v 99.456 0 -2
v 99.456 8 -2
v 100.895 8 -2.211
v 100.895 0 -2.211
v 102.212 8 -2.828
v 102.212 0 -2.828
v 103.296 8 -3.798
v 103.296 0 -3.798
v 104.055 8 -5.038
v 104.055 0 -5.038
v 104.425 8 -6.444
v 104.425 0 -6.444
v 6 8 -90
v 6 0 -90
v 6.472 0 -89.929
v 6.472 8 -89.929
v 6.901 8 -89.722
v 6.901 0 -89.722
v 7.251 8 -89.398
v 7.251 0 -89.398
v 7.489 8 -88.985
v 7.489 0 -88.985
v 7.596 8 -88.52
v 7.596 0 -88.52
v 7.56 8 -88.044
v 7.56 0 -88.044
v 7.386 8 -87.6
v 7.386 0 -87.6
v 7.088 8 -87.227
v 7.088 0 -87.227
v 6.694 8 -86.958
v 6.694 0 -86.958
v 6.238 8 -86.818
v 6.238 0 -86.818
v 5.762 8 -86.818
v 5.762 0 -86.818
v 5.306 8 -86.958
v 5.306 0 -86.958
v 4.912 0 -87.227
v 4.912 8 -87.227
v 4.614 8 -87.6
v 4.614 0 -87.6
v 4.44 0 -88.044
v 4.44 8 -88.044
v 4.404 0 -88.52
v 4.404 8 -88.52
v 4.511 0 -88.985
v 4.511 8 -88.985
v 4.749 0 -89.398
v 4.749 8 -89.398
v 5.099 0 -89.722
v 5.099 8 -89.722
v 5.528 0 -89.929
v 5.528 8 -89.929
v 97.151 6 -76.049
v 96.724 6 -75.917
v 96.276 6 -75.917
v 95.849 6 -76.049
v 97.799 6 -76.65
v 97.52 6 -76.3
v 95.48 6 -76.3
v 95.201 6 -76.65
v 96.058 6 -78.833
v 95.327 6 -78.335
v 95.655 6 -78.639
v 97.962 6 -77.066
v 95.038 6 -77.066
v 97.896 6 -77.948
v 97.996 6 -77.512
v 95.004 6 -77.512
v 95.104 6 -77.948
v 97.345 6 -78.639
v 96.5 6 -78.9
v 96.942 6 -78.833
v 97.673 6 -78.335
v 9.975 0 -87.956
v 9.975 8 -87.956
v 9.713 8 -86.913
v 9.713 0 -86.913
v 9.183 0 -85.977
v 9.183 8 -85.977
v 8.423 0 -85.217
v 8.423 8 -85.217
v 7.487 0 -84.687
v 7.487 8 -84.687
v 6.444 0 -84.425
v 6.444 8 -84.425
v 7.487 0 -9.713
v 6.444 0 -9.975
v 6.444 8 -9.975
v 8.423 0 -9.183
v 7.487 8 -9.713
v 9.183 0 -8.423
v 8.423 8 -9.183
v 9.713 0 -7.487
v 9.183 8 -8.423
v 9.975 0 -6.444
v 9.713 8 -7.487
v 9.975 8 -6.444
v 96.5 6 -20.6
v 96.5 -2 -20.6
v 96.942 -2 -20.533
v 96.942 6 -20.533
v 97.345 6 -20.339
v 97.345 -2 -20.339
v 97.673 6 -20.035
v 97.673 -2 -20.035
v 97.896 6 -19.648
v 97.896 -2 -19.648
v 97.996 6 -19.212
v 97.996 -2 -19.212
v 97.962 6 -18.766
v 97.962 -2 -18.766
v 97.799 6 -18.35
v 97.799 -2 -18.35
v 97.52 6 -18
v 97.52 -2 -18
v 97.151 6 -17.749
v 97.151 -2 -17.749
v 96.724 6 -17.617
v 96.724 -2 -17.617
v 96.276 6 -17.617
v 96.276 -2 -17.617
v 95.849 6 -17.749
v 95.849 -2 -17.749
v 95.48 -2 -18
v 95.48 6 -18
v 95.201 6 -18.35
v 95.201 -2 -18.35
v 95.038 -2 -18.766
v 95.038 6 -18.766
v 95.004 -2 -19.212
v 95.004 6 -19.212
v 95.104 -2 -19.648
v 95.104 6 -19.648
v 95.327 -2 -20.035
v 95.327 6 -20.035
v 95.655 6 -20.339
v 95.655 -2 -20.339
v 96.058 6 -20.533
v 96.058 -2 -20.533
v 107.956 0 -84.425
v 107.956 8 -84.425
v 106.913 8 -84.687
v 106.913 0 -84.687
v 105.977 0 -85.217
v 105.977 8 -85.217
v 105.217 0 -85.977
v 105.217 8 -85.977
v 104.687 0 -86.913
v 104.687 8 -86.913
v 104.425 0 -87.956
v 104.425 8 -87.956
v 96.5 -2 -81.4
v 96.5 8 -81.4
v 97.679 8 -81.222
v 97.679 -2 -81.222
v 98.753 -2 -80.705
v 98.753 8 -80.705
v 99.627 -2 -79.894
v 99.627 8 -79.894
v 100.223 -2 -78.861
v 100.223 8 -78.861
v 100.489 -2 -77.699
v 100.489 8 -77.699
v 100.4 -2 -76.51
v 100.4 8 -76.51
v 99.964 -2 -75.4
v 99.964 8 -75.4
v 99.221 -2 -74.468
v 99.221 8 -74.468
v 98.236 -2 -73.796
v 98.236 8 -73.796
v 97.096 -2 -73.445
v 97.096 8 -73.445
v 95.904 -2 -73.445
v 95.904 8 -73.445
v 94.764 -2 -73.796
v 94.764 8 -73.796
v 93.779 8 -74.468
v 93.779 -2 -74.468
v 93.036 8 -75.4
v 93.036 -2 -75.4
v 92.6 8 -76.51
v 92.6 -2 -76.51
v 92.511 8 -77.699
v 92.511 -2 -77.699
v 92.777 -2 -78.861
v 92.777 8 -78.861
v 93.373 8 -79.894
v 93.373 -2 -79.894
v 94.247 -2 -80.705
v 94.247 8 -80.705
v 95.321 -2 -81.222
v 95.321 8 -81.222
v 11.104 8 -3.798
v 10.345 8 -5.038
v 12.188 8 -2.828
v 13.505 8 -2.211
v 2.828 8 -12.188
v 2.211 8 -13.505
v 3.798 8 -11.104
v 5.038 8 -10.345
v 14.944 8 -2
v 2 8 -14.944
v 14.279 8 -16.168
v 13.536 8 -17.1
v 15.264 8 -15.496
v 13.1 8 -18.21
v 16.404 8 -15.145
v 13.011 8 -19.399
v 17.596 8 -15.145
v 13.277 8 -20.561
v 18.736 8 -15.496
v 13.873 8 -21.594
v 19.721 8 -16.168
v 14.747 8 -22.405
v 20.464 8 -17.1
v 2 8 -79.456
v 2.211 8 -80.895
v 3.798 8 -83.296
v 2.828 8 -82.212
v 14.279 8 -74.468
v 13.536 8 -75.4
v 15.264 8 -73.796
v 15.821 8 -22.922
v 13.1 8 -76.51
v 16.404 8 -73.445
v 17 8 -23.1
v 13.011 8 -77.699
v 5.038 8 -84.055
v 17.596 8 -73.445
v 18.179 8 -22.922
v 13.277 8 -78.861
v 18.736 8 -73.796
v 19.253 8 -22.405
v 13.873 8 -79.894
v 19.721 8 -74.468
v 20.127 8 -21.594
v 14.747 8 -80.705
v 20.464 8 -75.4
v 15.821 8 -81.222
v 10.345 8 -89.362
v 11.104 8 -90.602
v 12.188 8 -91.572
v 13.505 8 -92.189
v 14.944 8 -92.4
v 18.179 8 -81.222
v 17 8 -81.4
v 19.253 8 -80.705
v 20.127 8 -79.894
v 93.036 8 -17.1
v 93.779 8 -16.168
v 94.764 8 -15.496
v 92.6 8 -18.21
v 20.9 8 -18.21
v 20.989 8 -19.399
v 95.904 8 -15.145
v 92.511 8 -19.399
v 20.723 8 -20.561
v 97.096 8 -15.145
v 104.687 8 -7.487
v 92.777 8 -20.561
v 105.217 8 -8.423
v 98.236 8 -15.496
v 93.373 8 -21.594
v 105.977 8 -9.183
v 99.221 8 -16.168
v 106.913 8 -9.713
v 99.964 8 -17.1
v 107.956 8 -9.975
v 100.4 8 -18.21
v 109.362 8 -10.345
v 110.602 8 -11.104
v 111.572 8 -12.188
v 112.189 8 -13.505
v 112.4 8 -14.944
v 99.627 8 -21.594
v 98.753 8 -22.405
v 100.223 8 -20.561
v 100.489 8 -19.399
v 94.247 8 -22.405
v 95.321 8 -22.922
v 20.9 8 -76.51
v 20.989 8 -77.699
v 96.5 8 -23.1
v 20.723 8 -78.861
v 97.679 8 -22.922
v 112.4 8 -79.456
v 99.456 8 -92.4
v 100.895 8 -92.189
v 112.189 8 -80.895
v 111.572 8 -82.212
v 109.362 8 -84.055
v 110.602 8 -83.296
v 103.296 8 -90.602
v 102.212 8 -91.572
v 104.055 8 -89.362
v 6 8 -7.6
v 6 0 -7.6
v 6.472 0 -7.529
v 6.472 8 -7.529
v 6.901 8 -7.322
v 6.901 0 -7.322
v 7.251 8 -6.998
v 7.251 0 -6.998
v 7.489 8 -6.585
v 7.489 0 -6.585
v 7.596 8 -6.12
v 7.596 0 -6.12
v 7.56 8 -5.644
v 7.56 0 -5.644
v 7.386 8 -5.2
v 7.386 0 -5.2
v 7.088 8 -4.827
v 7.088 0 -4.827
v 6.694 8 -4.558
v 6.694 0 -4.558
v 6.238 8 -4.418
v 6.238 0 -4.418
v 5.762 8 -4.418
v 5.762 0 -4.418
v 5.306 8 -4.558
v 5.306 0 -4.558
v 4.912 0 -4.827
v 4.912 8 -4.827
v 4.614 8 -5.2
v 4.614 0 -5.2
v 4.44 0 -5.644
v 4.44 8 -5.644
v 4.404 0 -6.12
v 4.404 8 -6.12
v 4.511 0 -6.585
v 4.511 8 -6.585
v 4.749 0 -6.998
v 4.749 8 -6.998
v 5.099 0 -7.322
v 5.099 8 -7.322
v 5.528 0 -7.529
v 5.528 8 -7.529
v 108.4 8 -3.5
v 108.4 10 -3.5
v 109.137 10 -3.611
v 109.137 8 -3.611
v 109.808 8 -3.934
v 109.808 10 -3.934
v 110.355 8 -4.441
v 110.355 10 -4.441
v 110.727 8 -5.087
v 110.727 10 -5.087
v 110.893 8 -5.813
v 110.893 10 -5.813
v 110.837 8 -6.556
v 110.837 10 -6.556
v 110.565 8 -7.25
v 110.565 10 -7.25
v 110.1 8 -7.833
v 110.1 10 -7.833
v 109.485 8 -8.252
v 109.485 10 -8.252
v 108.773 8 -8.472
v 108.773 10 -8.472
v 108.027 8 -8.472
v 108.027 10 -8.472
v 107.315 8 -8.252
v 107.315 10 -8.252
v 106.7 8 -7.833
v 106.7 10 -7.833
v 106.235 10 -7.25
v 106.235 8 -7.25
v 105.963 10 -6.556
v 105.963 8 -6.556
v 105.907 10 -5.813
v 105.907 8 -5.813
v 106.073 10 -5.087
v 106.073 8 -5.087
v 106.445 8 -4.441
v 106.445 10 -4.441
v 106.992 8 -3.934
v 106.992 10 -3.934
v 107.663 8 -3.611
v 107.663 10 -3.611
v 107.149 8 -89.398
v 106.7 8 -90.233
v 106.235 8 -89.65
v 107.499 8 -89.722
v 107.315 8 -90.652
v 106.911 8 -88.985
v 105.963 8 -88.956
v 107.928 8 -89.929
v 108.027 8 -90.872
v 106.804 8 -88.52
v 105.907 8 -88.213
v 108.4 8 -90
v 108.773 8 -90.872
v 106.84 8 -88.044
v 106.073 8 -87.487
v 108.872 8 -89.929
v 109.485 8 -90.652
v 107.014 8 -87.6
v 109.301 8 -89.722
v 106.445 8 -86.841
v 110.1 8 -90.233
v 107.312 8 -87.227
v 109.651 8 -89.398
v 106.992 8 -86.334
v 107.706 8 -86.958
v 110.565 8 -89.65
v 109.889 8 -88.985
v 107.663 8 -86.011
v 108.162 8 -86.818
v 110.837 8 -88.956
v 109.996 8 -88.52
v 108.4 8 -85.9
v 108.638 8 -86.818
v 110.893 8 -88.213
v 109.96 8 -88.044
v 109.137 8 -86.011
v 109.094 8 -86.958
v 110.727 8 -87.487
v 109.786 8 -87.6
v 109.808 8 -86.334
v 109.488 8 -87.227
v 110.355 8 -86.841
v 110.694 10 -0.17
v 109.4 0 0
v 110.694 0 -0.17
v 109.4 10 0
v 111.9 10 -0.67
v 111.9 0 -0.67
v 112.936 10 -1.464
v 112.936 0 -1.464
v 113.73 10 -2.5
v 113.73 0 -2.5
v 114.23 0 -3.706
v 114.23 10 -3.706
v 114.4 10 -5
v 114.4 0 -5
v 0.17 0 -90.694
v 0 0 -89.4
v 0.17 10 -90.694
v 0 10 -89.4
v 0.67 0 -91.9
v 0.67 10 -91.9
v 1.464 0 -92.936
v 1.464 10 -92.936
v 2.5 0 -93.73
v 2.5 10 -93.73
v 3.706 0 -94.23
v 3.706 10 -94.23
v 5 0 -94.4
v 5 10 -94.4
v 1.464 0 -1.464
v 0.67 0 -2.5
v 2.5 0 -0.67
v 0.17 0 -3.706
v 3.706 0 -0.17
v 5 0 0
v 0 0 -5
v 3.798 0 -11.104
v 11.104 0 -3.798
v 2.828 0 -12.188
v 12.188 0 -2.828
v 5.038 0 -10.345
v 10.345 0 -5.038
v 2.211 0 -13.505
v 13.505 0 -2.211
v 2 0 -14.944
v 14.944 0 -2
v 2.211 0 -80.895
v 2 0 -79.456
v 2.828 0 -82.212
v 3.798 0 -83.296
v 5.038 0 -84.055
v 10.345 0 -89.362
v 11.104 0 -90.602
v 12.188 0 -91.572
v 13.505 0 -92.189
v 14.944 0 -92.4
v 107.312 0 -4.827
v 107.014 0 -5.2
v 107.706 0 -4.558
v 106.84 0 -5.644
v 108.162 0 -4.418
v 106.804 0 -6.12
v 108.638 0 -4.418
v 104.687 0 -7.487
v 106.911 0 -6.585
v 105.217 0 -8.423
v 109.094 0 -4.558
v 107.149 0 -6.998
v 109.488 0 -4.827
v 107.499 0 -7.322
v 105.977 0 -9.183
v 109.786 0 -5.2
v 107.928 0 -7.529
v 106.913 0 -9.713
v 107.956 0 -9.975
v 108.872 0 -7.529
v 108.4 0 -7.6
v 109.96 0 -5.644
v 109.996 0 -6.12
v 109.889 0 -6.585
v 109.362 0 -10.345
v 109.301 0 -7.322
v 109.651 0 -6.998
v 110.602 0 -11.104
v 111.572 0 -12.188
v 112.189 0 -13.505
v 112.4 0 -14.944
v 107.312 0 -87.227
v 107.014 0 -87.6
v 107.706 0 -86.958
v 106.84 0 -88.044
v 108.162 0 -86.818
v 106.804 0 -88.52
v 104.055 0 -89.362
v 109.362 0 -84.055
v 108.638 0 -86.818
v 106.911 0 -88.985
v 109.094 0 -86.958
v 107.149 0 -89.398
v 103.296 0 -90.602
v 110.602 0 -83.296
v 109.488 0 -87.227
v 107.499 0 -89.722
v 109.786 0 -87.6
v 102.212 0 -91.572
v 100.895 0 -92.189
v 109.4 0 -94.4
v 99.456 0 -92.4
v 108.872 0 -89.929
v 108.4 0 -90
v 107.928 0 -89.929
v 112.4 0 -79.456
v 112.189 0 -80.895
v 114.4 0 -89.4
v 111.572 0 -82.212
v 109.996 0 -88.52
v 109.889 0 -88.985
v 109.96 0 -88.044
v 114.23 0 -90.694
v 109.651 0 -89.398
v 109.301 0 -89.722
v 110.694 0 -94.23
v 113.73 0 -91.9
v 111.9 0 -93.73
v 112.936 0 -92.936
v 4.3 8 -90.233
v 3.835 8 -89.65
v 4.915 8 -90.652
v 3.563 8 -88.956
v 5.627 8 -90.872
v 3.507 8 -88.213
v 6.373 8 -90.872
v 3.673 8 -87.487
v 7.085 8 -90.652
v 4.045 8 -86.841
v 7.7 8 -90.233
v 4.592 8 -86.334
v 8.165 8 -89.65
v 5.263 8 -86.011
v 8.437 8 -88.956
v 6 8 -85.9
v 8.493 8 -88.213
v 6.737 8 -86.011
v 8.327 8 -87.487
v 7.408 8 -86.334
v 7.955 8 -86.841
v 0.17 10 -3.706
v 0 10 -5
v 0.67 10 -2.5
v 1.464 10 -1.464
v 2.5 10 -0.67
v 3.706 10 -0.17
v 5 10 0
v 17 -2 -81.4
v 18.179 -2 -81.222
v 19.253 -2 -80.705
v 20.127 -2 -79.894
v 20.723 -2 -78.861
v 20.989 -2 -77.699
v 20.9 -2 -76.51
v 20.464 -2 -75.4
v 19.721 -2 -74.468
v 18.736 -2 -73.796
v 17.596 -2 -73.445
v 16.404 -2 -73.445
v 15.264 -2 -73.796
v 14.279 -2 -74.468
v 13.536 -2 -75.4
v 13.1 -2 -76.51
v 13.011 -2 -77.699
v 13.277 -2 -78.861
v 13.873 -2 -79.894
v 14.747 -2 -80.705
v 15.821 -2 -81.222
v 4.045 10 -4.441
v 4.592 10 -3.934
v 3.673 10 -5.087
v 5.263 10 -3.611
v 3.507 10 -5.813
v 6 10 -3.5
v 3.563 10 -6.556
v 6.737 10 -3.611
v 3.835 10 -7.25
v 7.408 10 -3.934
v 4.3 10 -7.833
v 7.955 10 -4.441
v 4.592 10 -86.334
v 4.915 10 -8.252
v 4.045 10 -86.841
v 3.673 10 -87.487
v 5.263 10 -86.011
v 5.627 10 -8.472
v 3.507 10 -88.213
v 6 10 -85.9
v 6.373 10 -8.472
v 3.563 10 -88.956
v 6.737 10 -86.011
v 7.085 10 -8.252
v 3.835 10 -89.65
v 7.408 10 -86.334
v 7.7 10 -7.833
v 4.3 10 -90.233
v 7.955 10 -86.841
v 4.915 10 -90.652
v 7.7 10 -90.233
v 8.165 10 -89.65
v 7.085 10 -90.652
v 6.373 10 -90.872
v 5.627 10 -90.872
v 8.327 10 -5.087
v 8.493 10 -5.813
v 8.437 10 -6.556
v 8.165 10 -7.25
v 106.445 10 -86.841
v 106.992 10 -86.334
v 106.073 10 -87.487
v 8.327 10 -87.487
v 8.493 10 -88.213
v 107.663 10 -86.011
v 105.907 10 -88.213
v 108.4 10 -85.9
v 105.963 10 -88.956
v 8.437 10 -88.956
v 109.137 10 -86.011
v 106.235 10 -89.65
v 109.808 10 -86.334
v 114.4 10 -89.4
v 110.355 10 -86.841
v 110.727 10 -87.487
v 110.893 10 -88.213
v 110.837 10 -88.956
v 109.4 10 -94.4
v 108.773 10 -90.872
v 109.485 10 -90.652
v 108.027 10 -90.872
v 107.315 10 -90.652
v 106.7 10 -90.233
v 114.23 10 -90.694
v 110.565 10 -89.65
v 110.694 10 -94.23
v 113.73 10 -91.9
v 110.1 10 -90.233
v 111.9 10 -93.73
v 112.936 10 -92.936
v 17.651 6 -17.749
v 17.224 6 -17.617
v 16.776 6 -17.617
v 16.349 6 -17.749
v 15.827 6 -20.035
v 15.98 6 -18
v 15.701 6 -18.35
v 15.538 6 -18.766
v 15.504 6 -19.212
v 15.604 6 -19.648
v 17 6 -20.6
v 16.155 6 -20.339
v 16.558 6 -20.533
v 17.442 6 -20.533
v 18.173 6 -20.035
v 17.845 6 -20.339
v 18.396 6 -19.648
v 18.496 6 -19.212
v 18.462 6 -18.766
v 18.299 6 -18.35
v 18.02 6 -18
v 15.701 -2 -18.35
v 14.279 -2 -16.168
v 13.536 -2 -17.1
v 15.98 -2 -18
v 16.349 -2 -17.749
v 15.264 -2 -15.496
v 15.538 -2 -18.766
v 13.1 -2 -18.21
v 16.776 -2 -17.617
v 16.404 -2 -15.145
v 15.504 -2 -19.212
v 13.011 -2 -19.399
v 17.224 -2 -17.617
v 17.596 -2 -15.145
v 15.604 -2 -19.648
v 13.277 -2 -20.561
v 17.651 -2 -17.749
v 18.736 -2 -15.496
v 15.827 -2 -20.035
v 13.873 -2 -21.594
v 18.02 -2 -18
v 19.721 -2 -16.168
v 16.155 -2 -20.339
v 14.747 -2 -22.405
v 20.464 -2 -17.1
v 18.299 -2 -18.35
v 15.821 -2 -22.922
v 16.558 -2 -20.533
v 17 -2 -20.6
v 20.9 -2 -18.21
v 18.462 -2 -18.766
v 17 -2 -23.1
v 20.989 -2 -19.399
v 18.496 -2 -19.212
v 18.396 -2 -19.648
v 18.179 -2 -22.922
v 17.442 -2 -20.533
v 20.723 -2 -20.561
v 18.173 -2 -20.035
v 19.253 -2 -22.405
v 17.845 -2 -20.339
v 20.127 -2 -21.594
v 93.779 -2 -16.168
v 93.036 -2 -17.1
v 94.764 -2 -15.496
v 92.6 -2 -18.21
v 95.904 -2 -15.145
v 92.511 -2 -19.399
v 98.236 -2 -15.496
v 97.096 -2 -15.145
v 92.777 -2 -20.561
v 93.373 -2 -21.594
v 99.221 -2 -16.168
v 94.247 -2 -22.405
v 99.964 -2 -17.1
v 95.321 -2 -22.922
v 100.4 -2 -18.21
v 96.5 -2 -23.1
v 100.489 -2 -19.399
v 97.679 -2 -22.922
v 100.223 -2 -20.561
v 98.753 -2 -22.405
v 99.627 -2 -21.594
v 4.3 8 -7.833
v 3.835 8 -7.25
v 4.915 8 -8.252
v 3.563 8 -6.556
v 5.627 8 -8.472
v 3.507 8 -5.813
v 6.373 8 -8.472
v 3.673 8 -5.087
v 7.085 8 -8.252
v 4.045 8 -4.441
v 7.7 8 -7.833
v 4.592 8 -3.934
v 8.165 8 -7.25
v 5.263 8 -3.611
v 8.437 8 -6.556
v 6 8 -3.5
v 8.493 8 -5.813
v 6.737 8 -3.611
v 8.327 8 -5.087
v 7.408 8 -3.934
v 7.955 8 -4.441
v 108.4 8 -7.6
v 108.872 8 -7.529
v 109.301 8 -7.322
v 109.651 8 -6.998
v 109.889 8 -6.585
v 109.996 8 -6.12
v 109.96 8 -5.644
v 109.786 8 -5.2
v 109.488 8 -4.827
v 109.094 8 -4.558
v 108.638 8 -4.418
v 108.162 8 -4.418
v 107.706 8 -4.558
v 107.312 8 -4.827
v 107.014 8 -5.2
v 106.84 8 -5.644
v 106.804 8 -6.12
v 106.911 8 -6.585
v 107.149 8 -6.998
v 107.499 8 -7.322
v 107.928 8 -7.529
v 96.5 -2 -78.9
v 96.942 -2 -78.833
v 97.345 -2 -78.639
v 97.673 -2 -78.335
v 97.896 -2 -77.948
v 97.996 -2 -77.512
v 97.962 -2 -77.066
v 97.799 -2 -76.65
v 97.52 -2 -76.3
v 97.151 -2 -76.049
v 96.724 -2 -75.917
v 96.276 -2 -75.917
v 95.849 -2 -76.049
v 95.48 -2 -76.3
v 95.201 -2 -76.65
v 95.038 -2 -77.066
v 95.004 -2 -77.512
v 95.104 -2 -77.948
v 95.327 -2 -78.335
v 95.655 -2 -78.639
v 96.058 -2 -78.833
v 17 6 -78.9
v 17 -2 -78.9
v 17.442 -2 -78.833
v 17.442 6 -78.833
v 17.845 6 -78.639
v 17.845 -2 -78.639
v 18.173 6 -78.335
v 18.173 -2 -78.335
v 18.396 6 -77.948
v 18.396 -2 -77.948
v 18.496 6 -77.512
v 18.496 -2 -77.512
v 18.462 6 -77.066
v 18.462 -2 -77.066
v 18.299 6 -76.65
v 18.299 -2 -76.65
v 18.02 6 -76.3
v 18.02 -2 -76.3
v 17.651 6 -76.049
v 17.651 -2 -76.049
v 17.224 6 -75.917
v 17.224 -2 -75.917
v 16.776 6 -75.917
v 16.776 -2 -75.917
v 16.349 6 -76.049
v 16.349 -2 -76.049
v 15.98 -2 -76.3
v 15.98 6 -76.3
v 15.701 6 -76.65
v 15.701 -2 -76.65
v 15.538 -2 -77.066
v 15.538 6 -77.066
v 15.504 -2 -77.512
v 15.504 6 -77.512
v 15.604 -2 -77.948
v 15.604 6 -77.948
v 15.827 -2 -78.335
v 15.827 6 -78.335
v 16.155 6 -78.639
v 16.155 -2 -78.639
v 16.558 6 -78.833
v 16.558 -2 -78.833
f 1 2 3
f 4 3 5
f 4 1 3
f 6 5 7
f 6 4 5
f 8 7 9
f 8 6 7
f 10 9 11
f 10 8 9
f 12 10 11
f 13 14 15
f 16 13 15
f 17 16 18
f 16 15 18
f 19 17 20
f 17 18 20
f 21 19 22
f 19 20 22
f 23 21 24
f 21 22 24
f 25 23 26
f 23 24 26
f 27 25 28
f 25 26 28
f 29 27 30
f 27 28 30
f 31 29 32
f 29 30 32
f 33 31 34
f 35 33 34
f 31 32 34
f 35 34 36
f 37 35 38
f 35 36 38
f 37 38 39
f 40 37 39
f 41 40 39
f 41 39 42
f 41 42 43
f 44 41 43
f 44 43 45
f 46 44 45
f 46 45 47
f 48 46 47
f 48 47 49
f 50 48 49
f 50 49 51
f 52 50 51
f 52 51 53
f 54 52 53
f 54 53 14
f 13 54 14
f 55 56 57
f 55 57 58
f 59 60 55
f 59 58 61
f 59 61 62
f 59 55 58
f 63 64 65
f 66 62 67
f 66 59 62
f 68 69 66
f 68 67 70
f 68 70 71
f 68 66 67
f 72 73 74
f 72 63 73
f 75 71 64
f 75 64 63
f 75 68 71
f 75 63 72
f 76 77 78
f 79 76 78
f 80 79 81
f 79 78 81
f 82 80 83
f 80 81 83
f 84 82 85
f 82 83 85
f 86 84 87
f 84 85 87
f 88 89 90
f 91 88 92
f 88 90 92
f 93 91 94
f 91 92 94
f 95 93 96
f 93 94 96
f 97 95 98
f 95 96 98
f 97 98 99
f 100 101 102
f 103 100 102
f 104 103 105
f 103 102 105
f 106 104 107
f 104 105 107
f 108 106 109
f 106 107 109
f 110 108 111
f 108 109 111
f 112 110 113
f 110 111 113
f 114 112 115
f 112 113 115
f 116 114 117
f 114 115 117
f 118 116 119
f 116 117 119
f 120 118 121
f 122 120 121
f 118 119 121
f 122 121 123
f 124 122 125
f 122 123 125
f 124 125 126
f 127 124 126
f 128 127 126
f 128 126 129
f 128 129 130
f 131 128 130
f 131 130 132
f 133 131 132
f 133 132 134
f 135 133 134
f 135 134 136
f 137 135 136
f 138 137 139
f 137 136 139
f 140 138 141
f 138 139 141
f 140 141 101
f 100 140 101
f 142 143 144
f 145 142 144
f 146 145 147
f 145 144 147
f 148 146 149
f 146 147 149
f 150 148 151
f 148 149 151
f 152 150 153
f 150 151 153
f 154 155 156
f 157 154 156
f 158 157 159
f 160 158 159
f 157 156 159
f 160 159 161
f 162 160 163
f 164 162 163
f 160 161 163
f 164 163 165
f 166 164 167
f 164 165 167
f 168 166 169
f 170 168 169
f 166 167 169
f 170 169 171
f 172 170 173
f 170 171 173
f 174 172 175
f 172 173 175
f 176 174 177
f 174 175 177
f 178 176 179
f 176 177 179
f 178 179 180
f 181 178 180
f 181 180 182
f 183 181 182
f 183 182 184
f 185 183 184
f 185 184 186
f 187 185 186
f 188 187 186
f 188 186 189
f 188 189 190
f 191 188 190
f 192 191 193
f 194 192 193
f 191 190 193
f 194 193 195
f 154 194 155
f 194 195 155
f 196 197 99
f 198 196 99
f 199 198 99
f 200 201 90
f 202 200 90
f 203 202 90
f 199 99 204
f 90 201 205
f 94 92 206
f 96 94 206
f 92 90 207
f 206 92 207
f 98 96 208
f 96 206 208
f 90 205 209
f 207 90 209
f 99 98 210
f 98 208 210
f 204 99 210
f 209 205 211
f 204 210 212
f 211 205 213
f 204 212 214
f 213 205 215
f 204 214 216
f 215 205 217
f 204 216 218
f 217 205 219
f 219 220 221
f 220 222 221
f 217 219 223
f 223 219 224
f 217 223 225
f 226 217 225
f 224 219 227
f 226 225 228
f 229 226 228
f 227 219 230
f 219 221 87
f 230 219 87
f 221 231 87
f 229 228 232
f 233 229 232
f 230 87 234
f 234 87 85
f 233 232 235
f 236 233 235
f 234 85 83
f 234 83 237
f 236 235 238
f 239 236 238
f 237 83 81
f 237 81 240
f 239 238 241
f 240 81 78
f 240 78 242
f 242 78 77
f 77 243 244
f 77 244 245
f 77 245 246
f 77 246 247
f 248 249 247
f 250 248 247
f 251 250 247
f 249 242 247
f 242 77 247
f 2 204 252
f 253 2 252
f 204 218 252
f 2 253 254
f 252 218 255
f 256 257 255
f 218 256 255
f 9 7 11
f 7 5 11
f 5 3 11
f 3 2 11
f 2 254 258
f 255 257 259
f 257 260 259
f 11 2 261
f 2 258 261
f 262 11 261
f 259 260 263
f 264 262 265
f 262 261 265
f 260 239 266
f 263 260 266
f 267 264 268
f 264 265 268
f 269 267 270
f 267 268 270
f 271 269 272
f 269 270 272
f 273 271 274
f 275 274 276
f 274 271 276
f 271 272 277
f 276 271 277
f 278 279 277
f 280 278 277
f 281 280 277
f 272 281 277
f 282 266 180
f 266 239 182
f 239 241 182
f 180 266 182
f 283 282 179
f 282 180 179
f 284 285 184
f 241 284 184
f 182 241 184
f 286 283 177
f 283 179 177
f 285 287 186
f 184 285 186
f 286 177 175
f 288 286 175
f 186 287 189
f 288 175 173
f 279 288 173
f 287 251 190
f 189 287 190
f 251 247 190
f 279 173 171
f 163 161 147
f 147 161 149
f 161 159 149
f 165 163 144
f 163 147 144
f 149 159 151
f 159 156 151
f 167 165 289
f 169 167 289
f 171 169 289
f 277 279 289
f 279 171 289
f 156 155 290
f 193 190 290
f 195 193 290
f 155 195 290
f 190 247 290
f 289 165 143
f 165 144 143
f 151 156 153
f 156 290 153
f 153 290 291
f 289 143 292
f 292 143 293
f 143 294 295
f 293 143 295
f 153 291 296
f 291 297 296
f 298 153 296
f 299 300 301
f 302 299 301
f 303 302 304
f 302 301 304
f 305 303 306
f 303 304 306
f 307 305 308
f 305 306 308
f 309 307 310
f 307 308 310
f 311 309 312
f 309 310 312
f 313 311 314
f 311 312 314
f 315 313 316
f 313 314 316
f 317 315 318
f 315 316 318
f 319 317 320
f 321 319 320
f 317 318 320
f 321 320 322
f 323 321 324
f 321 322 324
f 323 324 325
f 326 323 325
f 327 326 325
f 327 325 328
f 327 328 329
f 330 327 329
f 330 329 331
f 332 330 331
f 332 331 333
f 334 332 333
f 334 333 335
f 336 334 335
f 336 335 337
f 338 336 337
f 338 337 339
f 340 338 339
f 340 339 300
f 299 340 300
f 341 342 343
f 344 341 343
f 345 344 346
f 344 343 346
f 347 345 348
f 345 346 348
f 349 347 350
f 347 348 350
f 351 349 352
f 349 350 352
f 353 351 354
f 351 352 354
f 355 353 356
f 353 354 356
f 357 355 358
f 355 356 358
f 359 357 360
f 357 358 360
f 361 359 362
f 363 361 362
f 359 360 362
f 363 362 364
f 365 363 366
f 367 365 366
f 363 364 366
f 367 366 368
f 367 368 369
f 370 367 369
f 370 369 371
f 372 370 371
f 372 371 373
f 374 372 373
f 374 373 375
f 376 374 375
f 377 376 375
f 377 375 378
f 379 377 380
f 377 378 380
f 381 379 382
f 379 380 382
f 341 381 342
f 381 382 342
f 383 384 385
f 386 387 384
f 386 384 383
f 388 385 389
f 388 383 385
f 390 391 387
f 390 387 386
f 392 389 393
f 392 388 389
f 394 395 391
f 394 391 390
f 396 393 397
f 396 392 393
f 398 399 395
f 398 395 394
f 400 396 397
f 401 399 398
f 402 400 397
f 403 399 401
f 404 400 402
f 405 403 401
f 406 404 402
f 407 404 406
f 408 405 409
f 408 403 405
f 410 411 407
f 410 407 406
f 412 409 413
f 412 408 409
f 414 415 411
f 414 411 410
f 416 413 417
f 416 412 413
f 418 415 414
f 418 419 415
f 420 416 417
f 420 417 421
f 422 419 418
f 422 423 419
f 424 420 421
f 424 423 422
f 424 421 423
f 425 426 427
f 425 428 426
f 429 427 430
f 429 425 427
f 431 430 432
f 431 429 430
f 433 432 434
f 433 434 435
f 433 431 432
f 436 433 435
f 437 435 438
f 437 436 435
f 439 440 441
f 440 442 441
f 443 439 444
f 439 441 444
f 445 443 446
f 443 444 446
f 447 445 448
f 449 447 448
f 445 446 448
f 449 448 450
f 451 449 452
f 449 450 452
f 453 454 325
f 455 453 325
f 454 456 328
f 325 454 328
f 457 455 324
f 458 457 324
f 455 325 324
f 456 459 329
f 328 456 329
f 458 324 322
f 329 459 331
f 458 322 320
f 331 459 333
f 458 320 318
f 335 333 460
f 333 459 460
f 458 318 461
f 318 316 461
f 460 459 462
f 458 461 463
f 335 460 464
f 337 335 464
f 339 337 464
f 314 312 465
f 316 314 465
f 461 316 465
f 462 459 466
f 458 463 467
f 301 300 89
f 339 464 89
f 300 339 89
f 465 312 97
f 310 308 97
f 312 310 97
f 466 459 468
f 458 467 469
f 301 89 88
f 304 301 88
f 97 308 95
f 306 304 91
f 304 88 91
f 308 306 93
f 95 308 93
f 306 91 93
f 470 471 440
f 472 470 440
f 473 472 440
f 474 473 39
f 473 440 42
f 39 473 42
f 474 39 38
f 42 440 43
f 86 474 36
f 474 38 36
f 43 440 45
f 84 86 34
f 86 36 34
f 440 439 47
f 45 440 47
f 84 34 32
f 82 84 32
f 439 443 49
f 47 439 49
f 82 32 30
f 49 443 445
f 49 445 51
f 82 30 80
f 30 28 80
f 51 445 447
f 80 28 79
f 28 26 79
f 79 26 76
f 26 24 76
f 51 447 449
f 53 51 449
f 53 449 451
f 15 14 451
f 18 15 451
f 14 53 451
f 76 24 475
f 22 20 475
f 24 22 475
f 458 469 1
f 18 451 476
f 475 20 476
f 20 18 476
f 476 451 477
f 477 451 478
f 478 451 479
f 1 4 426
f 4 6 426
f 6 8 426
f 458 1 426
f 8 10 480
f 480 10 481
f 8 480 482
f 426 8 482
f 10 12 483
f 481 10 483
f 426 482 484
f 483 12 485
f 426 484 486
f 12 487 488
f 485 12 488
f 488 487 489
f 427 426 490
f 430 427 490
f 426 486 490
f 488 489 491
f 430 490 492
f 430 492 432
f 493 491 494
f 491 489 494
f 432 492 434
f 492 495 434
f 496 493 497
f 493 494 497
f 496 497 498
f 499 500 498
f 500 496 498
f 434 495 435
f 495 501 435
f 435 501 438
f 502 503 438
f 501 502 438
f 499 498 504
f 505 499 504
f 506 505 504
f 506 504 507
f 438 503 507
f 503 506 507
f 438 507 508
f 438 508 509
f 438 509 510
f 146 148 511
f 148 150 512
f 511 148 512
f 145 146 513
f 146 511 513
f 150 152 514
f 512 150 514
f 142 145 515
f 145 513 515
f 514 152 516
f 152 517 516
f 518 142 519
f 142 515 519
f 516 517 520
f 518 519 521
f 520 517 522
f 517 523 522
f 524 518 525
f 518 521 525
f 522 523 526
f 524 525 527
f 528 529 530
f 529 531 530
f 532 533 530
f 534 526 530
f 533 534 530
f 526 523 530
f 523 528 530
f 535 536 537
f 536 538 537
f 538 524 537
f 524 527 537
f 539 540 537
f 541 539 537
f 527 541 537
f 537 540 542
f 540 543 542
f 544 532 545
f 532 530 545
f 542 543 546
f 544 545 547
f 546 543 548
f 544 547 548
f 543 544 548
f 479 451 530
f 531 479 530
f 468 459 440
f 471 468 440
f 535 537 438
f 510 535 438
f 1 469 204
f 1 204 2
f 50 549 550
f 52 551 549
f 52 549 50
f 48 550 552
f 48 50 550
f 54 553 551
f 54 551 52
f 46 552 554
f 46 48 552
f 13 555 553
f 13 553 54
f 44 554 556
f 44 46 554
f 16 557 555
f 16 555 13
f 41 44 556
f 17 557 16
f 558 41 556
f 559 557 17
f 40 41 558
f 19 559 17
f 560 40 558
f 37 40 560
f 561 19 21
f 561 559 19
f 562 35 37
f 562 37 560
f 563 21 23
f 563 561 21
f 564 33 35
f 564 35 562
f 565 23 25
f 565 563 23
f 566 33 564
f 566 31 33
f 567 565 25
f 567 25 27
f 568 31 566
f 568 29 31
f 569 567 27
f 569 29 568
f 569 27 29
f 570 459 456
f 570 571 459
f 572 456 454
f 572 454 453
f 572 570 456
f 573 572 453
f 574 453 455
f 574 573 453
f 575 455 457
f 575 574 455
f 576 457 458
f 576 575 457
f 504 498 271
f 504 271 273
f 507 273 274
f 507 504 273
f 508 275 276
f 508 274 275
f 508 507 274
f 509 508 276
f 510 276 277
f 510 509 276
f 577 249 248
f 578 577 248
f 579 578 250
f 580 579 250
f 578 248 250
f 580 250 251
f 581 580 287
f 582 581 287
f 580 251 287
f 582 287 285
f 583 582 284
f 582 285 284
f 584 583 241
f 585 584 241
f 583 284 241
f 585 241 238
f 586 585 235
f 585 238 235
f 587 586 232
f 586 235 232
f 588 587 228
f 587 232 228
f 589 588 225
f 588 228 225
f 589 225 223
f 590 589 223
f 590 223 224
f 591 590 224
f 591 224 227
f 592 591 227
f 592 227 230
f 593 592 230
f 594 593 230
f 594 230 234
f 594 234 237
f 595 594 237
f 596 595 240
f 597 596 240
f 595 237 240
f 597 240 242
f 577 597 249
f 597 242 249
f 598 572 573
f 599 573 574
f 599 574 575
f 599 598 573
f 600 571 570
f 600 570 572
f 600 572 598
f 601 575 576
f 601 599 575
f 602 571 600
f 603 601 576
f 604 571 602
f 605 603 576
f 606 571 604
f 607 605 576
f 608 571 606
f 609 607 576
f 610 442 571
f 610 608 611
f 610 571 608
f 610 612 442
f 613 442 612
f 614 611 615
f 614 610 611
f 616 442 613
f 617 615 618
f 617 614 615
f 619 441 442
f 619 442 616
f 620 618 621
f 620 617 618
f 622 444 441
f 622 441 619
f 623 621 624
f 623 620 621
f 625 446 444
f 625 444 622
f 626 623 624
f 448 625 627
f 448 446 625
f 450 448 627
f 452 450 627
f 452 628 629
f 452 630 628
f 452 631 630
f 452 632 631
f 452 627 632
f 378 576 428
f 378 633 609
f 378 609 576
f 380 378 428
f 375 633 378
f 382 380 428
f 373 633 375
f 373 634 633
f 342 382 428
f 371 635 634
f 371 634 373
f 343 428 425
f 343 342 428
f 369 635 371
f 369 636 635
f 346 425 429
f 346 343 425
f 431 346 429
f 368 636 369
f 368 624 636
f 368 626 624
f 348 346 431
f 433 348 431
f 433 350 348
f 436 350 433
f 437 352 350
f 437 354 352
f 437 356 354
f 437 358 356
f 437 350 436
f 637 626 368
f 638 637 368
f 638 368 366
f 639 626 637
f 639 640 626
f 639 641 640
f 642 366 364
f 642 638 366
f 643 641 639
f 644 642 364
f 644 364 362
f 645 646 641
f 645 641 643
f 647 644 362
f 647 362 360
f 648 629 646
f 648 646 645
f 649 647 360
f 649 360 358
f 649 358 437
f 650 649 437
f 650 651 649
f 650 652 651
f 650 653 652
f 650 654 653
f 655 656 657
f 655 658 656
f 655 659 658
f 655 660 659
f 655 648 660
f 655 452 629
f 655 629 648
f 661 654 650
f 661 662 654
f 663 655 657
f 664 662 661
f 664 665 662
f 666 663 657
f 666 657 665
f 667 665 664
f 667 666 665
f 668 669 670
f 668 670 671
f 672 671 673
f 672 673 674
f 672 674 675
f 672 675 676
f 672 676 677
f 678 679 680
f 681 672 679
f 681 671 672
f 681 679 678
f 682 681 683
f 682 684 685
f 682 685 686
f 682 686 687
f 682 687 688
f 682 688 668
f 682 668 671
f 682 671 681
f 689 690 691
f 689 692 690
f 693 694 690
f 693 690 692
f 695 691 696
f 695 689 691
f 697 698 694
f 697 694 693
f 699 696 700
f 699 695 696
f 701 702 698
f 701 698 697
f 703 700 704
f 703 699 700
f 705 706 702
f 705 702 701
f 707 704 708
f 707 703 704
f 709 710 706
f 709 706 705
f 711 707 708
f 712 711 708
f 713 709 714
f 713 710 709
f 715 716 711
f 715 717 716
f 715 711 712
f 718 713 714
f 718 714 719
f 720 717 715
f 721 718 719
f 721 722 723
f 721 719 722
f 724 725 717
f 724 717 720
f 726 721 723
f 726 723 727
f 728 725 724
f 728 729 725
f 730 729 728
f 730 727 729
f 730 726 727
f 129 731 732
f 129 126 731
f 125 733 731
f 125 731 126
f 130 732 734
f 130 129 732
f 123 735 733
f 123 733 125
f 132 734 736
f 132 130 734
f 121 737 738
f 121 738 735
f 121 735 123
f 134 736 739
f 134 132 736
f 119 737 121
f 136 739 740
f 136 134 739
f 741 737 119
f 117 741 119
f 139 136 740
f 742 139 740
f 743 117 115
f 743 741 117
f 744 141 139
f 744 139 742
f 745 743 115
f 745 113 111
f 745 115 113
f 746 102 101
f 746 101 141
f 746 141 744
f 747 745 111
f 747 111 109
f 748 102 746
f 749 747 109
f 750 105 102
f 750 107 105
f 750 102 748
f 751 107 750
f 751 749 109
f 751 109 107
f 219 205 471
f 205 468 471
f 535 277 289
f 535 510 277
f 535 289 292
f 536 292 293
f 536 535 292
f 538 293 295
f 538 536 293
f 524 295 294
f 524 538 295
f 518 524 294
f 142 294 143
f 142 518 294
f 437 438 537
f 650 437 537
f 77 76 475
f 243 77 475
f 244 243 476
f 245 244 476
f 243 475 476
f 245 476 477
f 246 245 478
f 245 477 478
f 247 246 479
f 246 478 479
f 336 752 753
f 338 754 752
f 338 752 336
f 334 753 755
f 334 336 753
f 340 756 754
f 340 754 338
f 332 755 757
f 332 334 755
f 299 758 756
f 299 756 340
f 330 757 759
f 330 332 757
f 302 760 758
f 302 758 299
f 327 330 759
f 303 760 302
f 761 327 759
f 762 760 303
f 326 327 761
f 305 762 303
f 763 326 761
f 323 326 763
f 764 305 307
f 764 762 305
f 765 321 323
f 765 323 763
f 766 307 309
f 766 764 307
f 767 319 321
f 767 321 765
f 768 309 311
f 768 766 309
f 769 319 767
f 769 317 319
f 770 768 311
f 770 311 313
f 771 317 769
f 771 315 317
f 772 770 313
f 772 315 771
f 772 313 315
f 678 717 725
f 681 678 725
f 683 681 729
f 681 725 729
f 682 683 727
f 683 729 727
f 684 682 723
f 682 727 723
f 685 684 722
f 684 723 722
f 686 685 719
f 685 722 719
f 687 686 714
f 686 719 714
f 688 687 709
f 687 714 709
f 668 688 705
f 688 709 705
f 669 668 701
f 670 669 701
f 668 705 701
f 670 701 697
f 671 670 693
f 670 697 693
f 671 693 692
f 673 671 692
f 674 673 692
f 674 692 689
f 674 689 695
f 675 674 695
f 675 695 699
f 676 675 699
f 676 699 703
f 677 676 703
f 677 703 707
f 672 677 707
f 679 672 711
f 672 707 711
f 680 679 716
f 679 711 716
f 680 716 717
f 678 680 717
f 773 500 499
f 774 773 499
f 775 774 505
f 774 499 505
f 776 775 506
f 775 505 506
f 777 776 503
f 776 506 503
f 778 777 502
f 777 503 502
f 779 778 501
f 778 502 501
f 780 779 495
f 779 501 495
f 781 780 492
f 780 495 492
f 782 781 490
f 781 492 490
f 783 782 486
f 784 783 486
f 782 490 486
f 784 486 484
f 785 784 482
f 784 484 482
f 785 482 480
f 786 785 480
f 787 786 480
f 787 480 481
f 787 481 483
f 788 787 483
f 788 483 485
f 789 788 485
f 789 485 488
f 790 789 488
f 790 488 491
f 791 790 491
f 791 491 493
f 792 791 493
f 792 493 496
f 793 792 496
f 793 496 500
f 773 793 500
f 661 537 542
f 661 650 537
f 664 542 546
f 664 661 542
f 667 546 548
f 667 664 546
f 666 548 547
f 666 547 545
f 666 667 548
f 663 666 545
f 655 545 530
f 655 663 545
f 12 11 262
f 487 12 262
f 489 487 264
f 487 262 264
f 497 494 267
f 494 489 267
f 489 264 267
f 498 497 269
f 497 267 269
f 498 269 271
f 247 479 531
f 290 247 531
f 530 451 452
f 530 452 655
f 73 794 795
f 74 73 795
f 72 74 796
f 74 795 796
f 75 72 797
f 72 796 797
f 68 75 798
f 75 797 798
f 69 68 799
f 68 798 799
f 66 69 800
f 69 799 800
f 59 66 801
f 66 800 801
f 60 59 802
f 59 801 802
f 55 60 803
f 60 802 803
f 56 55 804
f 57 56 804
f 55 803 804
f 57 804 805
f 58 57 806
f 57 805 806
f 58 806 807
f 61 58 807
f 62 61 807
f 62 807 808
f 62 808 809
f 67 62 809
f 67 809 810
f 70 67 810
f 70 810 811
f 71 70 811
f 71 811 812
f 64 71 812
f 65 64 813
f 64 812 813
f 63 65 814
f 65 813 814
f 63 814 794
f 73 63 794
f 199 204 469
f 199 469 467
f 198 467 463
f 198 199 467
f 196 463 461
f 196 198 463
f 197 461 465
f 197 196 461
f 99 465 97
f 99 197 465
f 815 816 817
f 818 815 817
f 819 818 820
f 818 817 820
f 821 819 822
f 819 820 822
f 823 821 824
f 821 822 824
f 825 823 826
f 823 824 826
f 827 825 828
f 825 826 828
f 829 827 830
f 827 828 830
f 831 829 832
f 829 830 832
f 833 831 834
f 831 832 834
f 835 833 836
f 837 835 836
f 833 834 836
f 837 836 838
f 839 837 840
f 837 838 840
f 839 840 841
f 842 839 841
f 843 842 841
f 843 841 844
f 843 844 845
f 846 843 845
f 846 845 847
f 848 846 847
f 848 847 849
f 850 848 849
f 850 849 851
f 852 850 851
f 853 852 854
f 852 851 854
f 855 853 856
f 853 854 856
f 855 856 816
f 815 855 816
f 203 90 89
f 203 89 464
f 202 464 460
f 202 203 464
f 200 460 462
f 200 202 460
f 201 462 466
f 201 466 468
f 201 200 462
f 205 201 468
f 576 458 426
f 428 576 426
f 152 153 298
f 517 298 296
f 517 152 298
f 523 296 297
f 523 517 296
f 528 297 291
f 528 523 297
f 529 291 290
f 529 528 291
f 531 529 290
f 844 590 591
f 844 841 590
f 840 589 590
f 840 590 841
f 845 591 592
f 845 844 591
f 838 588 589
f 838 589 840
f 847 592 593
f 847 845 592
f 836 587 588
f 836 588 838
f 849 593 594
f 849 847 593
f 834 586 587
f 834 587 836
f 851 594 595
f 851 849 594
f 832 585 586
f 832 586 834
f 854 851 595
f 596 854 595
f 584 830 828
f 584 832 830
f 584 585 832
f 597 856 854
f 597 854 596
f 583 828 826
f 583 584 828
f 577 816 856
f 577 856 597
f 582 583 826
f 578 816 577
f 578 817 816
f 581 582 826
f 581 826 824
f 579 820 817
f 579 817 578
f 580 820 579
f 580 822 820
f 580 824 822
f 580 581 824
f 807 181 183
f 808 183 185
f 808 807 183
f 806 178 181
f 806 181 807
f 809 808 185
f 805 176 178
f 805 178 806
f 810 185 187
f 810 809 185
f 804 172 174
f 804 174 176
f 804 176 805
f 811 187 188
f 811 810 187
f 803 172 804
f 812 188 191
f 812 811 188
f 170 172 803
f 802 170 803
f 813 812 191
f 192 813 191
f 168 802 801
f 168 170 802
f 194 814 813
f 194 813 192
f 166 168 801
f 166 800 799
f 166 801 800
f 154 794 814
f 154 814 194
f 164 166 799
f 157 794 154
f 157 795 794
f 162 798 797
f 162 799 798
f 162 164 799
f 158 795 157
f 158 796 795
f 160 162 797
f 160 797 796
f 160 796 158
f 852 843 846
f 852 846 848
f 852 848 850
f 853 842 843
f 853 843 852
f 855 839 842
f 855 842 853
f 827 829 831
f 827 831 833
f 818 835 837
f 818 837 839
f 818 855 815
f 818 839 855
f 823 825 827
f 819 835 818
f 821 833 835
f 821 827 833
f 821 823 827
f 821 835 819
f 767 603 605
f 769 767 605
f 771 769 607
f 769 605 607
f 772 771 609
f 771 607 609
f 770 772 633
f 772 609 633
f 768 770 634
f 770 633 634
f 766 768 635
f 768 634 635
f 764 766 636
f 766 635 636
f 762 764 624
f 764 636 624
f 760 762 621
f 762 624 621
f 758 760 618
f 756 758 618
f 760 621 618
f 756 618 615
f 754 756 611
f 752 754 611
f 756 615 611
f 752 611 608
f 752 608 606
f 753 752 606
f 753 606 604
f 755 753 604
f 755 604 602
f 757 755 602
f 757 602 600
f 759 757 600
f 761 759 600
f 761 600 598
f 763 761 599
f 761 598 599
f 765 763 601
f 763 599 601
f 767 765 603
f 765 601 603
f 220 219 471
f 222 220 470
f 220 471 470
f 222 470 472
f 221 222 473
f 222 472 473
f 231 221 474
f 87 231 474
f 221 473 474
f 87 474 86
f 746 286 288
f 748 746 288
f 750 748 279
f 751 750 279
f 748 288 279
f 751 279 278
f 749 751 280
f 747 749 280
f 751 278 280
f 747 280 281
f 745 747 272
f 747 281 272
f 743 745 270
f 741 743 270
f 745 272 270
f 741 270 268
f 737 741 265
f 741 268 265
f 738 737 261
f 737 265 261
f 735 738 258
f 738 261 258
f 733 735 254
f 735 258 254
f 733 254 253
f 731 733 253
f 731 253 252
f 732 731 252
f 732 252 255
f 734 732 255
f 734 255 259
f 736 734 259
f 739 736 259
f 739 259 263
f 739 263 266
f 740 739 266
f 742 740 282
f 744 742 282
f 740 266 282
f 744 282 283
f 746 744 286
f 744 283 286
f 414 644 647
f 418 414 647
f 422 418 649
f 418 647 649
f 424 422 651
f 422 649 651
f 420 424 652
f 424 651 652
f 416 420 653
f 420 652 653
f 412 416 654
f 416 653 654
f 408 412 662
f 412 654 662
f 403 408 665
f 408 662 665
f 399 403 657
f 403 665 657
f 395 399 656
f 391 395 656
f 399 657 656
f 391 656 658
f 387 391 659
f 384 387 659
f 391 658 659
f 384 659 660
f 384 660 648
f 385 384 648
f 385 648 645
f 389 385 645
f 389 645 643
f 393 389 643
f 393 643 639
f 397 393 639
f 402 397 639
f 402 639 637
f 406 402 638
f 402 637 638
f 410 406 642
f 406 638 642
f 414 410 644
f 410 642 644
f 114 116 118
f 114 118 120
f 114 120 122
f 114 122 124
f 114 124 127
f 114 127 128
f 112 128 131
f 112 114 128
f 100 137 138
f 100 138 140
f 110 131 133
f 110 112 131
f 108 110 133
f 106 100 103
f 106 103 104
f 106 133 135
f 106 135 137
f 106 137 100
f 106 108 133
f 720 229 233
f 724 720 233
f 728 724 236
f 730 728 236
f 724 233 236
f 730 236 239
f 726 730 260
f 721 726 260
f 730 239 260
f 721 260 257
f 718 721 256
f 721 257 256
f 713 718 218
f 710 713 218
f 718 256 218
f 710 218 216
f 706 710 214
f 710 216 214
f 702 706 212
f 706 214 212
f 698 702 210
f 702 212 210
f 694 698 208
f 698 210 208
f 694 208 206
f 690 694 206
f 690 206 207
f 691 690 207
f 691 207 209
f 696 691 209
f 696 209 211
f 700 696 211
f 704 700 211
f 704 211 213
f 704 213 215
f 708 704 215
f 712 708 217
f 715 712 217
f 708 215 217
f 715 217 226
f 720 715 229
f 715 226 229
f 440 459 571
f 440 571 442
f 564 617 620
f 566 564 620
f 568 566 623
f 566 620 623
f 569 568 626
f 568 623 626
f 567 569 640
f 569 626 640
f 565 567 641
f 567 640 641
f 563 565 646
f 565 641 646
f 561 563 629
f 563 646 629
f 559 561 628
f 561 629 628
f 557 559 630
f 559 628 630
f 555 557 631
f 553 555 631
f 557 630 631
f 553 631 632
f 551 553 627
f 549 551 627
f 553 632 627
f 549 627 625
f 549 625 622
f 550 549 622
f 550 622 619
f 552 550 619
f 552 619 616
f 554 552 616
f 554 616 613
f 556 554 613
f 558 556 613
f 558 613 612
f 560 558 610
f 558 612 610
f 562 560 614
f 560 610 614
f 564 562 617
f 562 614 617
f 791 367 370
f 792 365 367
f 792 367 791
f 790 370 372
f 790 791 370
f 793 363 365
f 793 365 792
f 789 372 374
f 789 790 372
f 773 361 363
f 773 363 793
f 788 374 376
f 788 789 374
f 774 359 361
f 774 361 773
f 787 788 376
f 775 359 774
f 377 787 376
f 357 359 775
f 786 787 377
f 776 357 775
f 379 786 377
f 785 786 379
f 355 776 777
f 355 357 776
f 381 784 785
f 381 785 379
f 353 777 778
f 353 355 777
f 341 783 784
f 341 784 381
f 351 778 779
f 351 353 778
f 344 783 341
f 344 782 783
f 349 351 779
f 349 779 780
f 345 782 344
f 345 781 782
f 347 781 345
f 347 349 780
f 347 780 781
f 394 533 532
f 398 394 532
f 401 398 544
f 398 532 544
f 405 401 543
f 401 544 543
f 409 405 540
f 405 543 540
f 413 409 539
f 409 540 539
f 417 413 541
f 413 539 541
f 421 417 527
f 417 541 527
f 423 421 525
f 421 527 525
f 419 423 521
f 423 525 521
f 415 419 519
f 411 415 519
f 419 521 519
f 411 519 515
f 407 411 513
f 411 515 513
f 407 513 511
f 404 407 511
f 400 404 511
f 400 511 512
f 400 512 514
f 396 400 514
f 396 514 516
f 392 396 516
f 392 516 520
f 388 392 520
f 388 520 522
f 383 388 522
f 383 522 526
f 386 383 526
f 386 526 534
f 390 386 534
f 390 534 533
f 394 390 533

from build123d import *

# Parameters (mm, degrees)
SKETCH1_W            = 114.4
SKETCH1_H            = 94.4
BOSS_EXTRUDE1_DEPTH  = 10
SHELL2_T             = -2
FILLET3_R            = 5
FILLET4_R            = 5
SKETCH5_R            = 4
BOSS_EXTRUDE12_DEPTH = 8
FILLET5_R            = 5
FILLET6_R            = 5
FILLET7_R            = 5
FILLET8_R            = 5
FILLET9_R            = 5
FILLET10_R           = 5
FILLET11_DEPTH       = 9
FILLET12_DEPTH       = 9
SKETCH6_R            = 1.6
CUT_EXTRUDE1_DEPTH   = 10
SKETCH7_R            = 4
BOSS_EXTRUDE13_DEPTH = 10
SKETCH8_R            = 1.5
CUT_EXTRUDE2_DEPTH   = 8
SKETCH9_R            = 2.5
CUT_EXTRUDE3_DEPTH   = 2


with BuildPart() as part:
    # Sketch1 → Boss-Extrude1 (new body)
    with BuildSketch(Plane(origin=(0, 0, 0), x_dir=(1, 0, 0), z_dir=(0, 1, 0))):
        with Locations((57.2, 47.2)):
            Rectangle(SKETCH1_W, SKETCH1_H)
    extrude(amount=BOSS_EXTRUDE1_DEPTH)

    # Shell2
    shell2_openings = [part.faces().sort_by_distance(p)[0] for p in [
        (57.2, 0, -47.2),
    ]]
    offset(amount=SHELL2_T, openings=shell2_openings, kind=Kind.INTERSECTION)

    # Fillet3
    fillet3_edges = [part.edges().sort_by_distance(p)[0] for p in [
        (0, 5, -94.4),
        (114.4, 5, -94.4),
        (114.4, 5, 0),
        (0, 5, 0),
    ]]
    fillet(fillet3_edges, radius=FILLET3_R)

    # Fillet4
    fillet4_edges = [part.edges().sort_by_distance(p)[0] for p in [
        (2, 4, -92.4),
        (2, 4, -2),
        (112.4, 4, -2),
        (112.4, 4, -92.4),
    ]]
    fillet(fillet4_edges, radius=FILLET4_R)

    # Sketch5 → Boss-Extrude12 (add)
    with BuildSketch(Plane(origin=(0, 8, 0), x_dir=(-1, 0, 0), z_dir=(0, -1, 0))):
        with Locations((-108.4, 6)):
            Circle(SKETCH5_R)
        with Locations((-108.4, 88.4)):
            Circle(SKETCH5_R)
        with Locations((-6, 88.4)):
            Circle(SKETCH5_R)
        with Locations((-6, 6)):
            Circle(SKETCH5_R)
    extrude(amount=BOSS_EXTRUDE12_DEPTH)

    # Fillet5
    # the kernel refuses this fillet: 5 mm, written as the material it adds along each edge
    with BuildSketch(Plane(origin=(112.372048604, 0, -6.472048604), x_dir=(-0.783459029597643, 0, -0.6214434398574978), z_dir=(0, 1, 0))) as fillet5_piece_1_section:
        with BuildLine():
            CenterArc((9.160403969, -3.547792862), FILLET5_R, 134.800989095, 83.620629792)
            Line((5.243108821, -6.655010061), (4.851379306, -6.965731781))
            ThreePointArc((4.851379306, -6.965731781), (-0.085536357, -0.74172022), (-0.422348831, -0.26762187))
            Line((-0.422348831, -0.26762187), (0.35232323, 0.354779286))
            ThreePointArc((0.35232323, 0.354779286), (2.818585837, -0.661765711), (5.284848444, 0.354779286))
            Line((5.284848444, 0.354779286), (5.637171673, 0))
        make_face()
    fillet5_piece_1 = extrude(amount=29.180673535, mode=Mode.PRIVATE)
    fillet5_piece_1 = split(fillet5_piece_1, bisect_by=Plane(origin=(112.372048604, 10, -6.472048604), z_dir=(0, -1, 0)), keep=Keep.TOP, mode=Mode.PRIVATE)
    add(fillet5_piece_1)

    # Fillet6
    # the kernel refuses this fillet: 5 mm, written as the material it adds along each edge
    with BuildSketch(Plane(origin=(107.927951396, 0, -2.027951396), x_dir=(-0.6214434398574917, 0, -0.7834590295976479), z_dir=(0, 1, 0))) as fillet6_piece_1_section:
        with BuildLine():
            CenterArc((9.160403969, 3.547792862), FILLET6_R, 141.578381114, 83.620629792)
            Line((5.243108821, 6.655010061), (4.851379306, 6.965731781))
            ThreePointArc((4.851379306, 6.965731781), (-0.085536357, 0.74172022), (-0.422348831, 0.26762187))
            Line((-0.422348831, 0.26762187), (0.35232323, -0.354779286))
            ThreePointArc((0.35232323, -0.354779286), (2.818585837, 0.661765711), (5.284848444, -0.354779286))
            Line((5.284848444, -0.354779286), (5.637171673, 0))
        make_face()
    fillet6_piece_1 = extrude(amount=29.180673535, mode=Mode.PRIVATE)
    fillet6_piece_1 = split(fillet6_piece_1, bisect_by=Plane(origin=(107.927951396, 10, -2.027951396), z_dir=(0, -1, 0)), keep=Keep.TOP, mode=Mode.PRIVATE)
    add(fillet6_piece_1)

    # Fillet7
    # the kernel refuses this fillet: 5 mm, written as the material it adds along each edge
    with BuildSketch(Plane(origin=(112.372048604, 0, -87.927951396), x_dir=(-0.783459029597643, 0, 0.6214434398574978), z_dir=(0, 1, 0))) as fillet7_piece_1_section:
        with BuildLine():
            CenterArc((9.160403969, 3.547792862), FILLET7_R, 141.578381114, 83.620629792)
            Line((5.243108821, 6.655010061), (4.851379306, 6.965731781))
            ThreePointArc((4.851379306, 6.965731781), (-0.085536357, 0.74172022), (-0.422348831, 0.26762187))
            Line((-0.422348831, 0.26762187), (0.35232323, -0.354779286))
            ThreePointArc((0.35232323, -0.354779286), (2.818585837, 0.661765711), (5.284848444, -0.354779286))
            Line((5.284848444, -0.354779286), (5.637171673, 0))
        make_face()
    fillet7_piece_1 = extrude(amount=29.180673535, mode=Mode.PRIVATE)
    fillet7_piece_1 = split(fillet7_piece_1, bisect_by=Plane(origin=(112.372048604, 10, -87.927951396), z_dir=(0, -1, 0)), keep=Keep.TOP, mode=Mode.PRIVATE)
    add(fillet7_piece_1)

    # Fillet8
    # the kernel refuses this fillet: 5 mm, written as the material it adds along each edge
    with BuildSketch(Plane(origin=(107.927951396, 0, -92.372048604), x_dir=(-0.6214434398574917, 0, 0.7834590295976479), z_dir=(0, 1, 0))) as fillet8_piece_1_section:
        with BuildLine():
            CenterArc((9.160403969, -3.547792862), FILLET8_R, 134.800989095, 83.620629792)
            Line((5.243108821, -6.655010061), (4.851379306, -6.965731781))
            ThreePointArc((4.851379306, -6.965731781), (-0.085536357, -0.74172022), (-0.422348831, -0.26762187))
            Line((-0.422348831, -0.26762187), (0.35232323, 0.354779286))
            ThreePointArc((0.35232323, 0.354779286), (2.818585837, -0.661765711), (5.284848444, 0.354779286))
            Line((5.284848444, 0.354779286), (5.637171673, 0))
        make_face()
    fillet8_piece_1 = extrude(amount=29.180673535, mode=Mode.PRIVATE)
    fillet8_piece_1 = split(fillet8_piece_1, bisect_by=Plane(origin=(107.927951396, 10, -92.372048604), z_dir=(0, -1, 0)), keep=Keep.TOP, mode=Mode.PRIVATE)
    add(fillet8_piece_1)

    # Fillet9
    # the kernel refuses this fillet: 5 mm, written as the material it adds along each edge
    with BuildSketch(Plane(origin=(6.472048604, 29.180673535, -2.027951396), x_dir=(0.9999945577477605, 0, 0.003299162751511756), z_dir=(0, -1, 0))) as fillet9_piece_1_section:
        with BuildLine():
            CenterArc((8.4557736, -4.999972789), FILLET9_R, 89.810971555, 83.620629792)
            Line((3.488593561, -4.428026585), (2.991875557, -4.370831965))
            ThreePointArc((2.991875557, -4.370831965), (2.264117061, -1.804476076), (-0.060643809, -0.496308703))
            Line((-0.060643809, -0.496308703), (-0.051154492, 0.497376334))
            ThreePointArc((-0.051154492, 0.497376334), (0.52969032, 0.526206725), (8.473918995, 0.499997279))
            Line((8.473918995, 0.499997279), (8.472269414, 0))
        make_face()
    fillet9_piece_1 = extrude(amount=29.180673535, mode=Mode.PRIVATE)
    fillet9_piece_1 = split(fillet9_piece_1, bisect_by=Plane(origin=(6.472048604, 10, -2.027951396), z_dir=(0, -1, 0)), keep=Keep.TOP, mode=Mode.PRIVATE)
    add(fillet9_piece_1)

    # Fillet10
    # the kernel refuses this fillet: 5 mm, written as the material it adds along each edge
    with BuildSketch(Plane(origin=(2.027951396, 29.180673535, -6.472048604), x_dir=(0.783459029597646, 0, -0.6214434398574942), z_dir=(0, -1, 0))) as fillet10_piece_1_section:
        with BuildLine():
            CenterArc((9.160403969, -3.547792862), FILLET10_R, 134.800989095, 83.620629792)
            Line((5.243108821, -6.655010061), (4.851379306, -6.965731781))
            ThreePointArc((4.851379306, -6.965731781), (-0.085536357, -0.74172022), (-0.422348831, -0.26762187))
            Line((-0.422348831, -0.26762187), (0.35232323, 0.354779286))
            ThreePointArc((0.35232323, 0.354779286), (2.818585837, -0.661765711), (5.284848444, 0.354779286))
            Line((5.284848444, 0.354779286), (5.637171673, 0))
        make_face()
    fillet10_piece_1 = extrude(amount=29.180673535, mode=Mode.PRIVATE)
    fillet10_piece_1 = split(fillet10_piece_1, bisect_by=Plane(origin=(2.027951396, 10, -6.472048604), z_dir=(0, -1, 0)), keep=Keep.TOP, mode=Mode.PRIVATE)
    add(fillet10_piece_1)

    # Fillet11: read off the stored shape, not the designer's step
    # Fillet11 outline → Fillet11 (add)
    with BuildSketch(Plane(origin=(0, 0, 0), x_dir=(1, 0, 0), z_dir=(0, 1, 0))):
        with BuildLine():
            ThreePointArc((2, 79.45572809), (3.273220038, 82.789061423), (6.444444444, 84.42476804))
            ThreePointArc((6.444444444, 84.42476804), (3.51422624, 85.266163882), (2.027951396, 87.927951396))
            ThreePointArc((2.027951396, 87.927951396), (2.006992739, 87.664345398), (2, 87.4))
            Line((2, 87.4), (2, 79.45572809))
        make_face()
    extrude(amount=FILLET11_DEPTH)

    # Fillet12: read off the stored shape, not the designer's step
    # Fillet12 outline → Fillet12 (add)
    with BuildSketch(Plane(origin=(0, 0, 0), x_dir=(1, 0, 0), z_dir=(0, 1, 0))):
        with BuildLine():
            ThreePointArc((9.97523196, 87.955555556), (11.610938577, 91.126779962), (14.94427191, 92.4))
            Line((14.94427191, 92.4), (7, 92.4))
            ThreePointArc((7, 92.4), (6.735654602, 92.393007261), (6.472048604, 92.372048604))
            ThreePointArc((6.472048604, 92.372048604), (9.133836118, 90.88577376), (9.97523196, 87.955555556))
        make_face()
    extrude(amount=FILLET12_DEPTH)

    # Sketch6 → Cut-Extrude1 (cut)
    with BuildSketch(Plane(origin=(0, 0, 0), x_dir=(-1, 0, 0), z_dir=(0, -1, 0))):
        with Locations(Location((-6, 6, 0), (0, 0, 90))):
            Circle(SKETCH6_R)
        with Locations(Location((-108.4, 88.4, 0), (0, 0, 90))):
            Circle(SKETCH6_R)
        with Locations(Location((-108.4, 6, 0), (0, 0, 90))):
            Circle(SKETCH6_R)
        with Locations(Location((-6, 88.4, 0), (0, 0, 90))):
            Circle(SKETCH6_R)
    extrude(amount=-CUT_EXTRUDE1_DEPTH, mode=Mode.SUBTRACT)

    # Sketch7 → Boss-Extrude13 (add)
    with BuildSketch(Plane(origin=(0, 8, 0), x_dir=(-1, 0, 0), z_dir=(0, -1, 0))):
        with Locations(Location((-96.5, 19.1, 0), (0, 0, 90))):
            Circle(SKETCH7_R)
        with Locations(Location((-17, 19.1, 0), (0, 0, 90))):
            Circle(SKETCH7_R)
        with Locations(Location((-96.5, 77.4, 0), (0, 0, 90))):
            Circle(SKETCH7_R)
        with Locations(Location((-17, 77.4, 0), (0, 0, 90))):
            Circle(SKETCH7_R)
    extrude(amount=BOSS_EXTRUDE13_DEPTH)

    # Sketch8 → Cut-Extrude2 (cut)
    with BuildSketch(Plane(origin=(0, -2, 0), x_dir=(-1, 0, 0), z_dir=(0, -1, 0))):
        with Locations(Location((-17, 19.1, 0), (0, 0, 90))):
            Circle(SKETCH8_R)
        with Locations(Location((-96.5, 19.1, 0), (0, 0, 90))):
            Circle(SKETCH8_R)
        with Locations(Location((-96.5, 77.4, 0), (0, 0, 90))):
            Circle(SKETCH8_R)
        with Locations(Location((-17, 77.4, 0), (0, 0, 90))):
            Circle(SKETCH8_R)
    extrude(amount=-CUT_EXTRUDE2_DEPTH, mode=Mode.SUBTRACT)

    # Sketch9 → Cut-Extrude3 (cut)
    with BuildSketch(Plane(origin=(0, 10, 0), x_dir=(1, 0, 0), z_dir=(0, 1, 0))):
        with Locations(Location((6, 88.4, 0), (0, 0, 270))):
            Circle(SKETCH9_R)
        with Locations(Location((6, 6, 0), (0, 0, 270))):
            Circle(SKETCH9_R)
        with Locations(Location((108.4, 6, 0), (0, 0, 270))):
            Circle(SKETCH9_R)
        with Locations(Location((108.4, 88.4, 0), (0, 0, 270))):
            Circle(SKETCH9_R)
    extrude(amount=-CUT_EXTRUDE3_DEPTH, mode=Mode.SUBTRACT)


solid = part.part
